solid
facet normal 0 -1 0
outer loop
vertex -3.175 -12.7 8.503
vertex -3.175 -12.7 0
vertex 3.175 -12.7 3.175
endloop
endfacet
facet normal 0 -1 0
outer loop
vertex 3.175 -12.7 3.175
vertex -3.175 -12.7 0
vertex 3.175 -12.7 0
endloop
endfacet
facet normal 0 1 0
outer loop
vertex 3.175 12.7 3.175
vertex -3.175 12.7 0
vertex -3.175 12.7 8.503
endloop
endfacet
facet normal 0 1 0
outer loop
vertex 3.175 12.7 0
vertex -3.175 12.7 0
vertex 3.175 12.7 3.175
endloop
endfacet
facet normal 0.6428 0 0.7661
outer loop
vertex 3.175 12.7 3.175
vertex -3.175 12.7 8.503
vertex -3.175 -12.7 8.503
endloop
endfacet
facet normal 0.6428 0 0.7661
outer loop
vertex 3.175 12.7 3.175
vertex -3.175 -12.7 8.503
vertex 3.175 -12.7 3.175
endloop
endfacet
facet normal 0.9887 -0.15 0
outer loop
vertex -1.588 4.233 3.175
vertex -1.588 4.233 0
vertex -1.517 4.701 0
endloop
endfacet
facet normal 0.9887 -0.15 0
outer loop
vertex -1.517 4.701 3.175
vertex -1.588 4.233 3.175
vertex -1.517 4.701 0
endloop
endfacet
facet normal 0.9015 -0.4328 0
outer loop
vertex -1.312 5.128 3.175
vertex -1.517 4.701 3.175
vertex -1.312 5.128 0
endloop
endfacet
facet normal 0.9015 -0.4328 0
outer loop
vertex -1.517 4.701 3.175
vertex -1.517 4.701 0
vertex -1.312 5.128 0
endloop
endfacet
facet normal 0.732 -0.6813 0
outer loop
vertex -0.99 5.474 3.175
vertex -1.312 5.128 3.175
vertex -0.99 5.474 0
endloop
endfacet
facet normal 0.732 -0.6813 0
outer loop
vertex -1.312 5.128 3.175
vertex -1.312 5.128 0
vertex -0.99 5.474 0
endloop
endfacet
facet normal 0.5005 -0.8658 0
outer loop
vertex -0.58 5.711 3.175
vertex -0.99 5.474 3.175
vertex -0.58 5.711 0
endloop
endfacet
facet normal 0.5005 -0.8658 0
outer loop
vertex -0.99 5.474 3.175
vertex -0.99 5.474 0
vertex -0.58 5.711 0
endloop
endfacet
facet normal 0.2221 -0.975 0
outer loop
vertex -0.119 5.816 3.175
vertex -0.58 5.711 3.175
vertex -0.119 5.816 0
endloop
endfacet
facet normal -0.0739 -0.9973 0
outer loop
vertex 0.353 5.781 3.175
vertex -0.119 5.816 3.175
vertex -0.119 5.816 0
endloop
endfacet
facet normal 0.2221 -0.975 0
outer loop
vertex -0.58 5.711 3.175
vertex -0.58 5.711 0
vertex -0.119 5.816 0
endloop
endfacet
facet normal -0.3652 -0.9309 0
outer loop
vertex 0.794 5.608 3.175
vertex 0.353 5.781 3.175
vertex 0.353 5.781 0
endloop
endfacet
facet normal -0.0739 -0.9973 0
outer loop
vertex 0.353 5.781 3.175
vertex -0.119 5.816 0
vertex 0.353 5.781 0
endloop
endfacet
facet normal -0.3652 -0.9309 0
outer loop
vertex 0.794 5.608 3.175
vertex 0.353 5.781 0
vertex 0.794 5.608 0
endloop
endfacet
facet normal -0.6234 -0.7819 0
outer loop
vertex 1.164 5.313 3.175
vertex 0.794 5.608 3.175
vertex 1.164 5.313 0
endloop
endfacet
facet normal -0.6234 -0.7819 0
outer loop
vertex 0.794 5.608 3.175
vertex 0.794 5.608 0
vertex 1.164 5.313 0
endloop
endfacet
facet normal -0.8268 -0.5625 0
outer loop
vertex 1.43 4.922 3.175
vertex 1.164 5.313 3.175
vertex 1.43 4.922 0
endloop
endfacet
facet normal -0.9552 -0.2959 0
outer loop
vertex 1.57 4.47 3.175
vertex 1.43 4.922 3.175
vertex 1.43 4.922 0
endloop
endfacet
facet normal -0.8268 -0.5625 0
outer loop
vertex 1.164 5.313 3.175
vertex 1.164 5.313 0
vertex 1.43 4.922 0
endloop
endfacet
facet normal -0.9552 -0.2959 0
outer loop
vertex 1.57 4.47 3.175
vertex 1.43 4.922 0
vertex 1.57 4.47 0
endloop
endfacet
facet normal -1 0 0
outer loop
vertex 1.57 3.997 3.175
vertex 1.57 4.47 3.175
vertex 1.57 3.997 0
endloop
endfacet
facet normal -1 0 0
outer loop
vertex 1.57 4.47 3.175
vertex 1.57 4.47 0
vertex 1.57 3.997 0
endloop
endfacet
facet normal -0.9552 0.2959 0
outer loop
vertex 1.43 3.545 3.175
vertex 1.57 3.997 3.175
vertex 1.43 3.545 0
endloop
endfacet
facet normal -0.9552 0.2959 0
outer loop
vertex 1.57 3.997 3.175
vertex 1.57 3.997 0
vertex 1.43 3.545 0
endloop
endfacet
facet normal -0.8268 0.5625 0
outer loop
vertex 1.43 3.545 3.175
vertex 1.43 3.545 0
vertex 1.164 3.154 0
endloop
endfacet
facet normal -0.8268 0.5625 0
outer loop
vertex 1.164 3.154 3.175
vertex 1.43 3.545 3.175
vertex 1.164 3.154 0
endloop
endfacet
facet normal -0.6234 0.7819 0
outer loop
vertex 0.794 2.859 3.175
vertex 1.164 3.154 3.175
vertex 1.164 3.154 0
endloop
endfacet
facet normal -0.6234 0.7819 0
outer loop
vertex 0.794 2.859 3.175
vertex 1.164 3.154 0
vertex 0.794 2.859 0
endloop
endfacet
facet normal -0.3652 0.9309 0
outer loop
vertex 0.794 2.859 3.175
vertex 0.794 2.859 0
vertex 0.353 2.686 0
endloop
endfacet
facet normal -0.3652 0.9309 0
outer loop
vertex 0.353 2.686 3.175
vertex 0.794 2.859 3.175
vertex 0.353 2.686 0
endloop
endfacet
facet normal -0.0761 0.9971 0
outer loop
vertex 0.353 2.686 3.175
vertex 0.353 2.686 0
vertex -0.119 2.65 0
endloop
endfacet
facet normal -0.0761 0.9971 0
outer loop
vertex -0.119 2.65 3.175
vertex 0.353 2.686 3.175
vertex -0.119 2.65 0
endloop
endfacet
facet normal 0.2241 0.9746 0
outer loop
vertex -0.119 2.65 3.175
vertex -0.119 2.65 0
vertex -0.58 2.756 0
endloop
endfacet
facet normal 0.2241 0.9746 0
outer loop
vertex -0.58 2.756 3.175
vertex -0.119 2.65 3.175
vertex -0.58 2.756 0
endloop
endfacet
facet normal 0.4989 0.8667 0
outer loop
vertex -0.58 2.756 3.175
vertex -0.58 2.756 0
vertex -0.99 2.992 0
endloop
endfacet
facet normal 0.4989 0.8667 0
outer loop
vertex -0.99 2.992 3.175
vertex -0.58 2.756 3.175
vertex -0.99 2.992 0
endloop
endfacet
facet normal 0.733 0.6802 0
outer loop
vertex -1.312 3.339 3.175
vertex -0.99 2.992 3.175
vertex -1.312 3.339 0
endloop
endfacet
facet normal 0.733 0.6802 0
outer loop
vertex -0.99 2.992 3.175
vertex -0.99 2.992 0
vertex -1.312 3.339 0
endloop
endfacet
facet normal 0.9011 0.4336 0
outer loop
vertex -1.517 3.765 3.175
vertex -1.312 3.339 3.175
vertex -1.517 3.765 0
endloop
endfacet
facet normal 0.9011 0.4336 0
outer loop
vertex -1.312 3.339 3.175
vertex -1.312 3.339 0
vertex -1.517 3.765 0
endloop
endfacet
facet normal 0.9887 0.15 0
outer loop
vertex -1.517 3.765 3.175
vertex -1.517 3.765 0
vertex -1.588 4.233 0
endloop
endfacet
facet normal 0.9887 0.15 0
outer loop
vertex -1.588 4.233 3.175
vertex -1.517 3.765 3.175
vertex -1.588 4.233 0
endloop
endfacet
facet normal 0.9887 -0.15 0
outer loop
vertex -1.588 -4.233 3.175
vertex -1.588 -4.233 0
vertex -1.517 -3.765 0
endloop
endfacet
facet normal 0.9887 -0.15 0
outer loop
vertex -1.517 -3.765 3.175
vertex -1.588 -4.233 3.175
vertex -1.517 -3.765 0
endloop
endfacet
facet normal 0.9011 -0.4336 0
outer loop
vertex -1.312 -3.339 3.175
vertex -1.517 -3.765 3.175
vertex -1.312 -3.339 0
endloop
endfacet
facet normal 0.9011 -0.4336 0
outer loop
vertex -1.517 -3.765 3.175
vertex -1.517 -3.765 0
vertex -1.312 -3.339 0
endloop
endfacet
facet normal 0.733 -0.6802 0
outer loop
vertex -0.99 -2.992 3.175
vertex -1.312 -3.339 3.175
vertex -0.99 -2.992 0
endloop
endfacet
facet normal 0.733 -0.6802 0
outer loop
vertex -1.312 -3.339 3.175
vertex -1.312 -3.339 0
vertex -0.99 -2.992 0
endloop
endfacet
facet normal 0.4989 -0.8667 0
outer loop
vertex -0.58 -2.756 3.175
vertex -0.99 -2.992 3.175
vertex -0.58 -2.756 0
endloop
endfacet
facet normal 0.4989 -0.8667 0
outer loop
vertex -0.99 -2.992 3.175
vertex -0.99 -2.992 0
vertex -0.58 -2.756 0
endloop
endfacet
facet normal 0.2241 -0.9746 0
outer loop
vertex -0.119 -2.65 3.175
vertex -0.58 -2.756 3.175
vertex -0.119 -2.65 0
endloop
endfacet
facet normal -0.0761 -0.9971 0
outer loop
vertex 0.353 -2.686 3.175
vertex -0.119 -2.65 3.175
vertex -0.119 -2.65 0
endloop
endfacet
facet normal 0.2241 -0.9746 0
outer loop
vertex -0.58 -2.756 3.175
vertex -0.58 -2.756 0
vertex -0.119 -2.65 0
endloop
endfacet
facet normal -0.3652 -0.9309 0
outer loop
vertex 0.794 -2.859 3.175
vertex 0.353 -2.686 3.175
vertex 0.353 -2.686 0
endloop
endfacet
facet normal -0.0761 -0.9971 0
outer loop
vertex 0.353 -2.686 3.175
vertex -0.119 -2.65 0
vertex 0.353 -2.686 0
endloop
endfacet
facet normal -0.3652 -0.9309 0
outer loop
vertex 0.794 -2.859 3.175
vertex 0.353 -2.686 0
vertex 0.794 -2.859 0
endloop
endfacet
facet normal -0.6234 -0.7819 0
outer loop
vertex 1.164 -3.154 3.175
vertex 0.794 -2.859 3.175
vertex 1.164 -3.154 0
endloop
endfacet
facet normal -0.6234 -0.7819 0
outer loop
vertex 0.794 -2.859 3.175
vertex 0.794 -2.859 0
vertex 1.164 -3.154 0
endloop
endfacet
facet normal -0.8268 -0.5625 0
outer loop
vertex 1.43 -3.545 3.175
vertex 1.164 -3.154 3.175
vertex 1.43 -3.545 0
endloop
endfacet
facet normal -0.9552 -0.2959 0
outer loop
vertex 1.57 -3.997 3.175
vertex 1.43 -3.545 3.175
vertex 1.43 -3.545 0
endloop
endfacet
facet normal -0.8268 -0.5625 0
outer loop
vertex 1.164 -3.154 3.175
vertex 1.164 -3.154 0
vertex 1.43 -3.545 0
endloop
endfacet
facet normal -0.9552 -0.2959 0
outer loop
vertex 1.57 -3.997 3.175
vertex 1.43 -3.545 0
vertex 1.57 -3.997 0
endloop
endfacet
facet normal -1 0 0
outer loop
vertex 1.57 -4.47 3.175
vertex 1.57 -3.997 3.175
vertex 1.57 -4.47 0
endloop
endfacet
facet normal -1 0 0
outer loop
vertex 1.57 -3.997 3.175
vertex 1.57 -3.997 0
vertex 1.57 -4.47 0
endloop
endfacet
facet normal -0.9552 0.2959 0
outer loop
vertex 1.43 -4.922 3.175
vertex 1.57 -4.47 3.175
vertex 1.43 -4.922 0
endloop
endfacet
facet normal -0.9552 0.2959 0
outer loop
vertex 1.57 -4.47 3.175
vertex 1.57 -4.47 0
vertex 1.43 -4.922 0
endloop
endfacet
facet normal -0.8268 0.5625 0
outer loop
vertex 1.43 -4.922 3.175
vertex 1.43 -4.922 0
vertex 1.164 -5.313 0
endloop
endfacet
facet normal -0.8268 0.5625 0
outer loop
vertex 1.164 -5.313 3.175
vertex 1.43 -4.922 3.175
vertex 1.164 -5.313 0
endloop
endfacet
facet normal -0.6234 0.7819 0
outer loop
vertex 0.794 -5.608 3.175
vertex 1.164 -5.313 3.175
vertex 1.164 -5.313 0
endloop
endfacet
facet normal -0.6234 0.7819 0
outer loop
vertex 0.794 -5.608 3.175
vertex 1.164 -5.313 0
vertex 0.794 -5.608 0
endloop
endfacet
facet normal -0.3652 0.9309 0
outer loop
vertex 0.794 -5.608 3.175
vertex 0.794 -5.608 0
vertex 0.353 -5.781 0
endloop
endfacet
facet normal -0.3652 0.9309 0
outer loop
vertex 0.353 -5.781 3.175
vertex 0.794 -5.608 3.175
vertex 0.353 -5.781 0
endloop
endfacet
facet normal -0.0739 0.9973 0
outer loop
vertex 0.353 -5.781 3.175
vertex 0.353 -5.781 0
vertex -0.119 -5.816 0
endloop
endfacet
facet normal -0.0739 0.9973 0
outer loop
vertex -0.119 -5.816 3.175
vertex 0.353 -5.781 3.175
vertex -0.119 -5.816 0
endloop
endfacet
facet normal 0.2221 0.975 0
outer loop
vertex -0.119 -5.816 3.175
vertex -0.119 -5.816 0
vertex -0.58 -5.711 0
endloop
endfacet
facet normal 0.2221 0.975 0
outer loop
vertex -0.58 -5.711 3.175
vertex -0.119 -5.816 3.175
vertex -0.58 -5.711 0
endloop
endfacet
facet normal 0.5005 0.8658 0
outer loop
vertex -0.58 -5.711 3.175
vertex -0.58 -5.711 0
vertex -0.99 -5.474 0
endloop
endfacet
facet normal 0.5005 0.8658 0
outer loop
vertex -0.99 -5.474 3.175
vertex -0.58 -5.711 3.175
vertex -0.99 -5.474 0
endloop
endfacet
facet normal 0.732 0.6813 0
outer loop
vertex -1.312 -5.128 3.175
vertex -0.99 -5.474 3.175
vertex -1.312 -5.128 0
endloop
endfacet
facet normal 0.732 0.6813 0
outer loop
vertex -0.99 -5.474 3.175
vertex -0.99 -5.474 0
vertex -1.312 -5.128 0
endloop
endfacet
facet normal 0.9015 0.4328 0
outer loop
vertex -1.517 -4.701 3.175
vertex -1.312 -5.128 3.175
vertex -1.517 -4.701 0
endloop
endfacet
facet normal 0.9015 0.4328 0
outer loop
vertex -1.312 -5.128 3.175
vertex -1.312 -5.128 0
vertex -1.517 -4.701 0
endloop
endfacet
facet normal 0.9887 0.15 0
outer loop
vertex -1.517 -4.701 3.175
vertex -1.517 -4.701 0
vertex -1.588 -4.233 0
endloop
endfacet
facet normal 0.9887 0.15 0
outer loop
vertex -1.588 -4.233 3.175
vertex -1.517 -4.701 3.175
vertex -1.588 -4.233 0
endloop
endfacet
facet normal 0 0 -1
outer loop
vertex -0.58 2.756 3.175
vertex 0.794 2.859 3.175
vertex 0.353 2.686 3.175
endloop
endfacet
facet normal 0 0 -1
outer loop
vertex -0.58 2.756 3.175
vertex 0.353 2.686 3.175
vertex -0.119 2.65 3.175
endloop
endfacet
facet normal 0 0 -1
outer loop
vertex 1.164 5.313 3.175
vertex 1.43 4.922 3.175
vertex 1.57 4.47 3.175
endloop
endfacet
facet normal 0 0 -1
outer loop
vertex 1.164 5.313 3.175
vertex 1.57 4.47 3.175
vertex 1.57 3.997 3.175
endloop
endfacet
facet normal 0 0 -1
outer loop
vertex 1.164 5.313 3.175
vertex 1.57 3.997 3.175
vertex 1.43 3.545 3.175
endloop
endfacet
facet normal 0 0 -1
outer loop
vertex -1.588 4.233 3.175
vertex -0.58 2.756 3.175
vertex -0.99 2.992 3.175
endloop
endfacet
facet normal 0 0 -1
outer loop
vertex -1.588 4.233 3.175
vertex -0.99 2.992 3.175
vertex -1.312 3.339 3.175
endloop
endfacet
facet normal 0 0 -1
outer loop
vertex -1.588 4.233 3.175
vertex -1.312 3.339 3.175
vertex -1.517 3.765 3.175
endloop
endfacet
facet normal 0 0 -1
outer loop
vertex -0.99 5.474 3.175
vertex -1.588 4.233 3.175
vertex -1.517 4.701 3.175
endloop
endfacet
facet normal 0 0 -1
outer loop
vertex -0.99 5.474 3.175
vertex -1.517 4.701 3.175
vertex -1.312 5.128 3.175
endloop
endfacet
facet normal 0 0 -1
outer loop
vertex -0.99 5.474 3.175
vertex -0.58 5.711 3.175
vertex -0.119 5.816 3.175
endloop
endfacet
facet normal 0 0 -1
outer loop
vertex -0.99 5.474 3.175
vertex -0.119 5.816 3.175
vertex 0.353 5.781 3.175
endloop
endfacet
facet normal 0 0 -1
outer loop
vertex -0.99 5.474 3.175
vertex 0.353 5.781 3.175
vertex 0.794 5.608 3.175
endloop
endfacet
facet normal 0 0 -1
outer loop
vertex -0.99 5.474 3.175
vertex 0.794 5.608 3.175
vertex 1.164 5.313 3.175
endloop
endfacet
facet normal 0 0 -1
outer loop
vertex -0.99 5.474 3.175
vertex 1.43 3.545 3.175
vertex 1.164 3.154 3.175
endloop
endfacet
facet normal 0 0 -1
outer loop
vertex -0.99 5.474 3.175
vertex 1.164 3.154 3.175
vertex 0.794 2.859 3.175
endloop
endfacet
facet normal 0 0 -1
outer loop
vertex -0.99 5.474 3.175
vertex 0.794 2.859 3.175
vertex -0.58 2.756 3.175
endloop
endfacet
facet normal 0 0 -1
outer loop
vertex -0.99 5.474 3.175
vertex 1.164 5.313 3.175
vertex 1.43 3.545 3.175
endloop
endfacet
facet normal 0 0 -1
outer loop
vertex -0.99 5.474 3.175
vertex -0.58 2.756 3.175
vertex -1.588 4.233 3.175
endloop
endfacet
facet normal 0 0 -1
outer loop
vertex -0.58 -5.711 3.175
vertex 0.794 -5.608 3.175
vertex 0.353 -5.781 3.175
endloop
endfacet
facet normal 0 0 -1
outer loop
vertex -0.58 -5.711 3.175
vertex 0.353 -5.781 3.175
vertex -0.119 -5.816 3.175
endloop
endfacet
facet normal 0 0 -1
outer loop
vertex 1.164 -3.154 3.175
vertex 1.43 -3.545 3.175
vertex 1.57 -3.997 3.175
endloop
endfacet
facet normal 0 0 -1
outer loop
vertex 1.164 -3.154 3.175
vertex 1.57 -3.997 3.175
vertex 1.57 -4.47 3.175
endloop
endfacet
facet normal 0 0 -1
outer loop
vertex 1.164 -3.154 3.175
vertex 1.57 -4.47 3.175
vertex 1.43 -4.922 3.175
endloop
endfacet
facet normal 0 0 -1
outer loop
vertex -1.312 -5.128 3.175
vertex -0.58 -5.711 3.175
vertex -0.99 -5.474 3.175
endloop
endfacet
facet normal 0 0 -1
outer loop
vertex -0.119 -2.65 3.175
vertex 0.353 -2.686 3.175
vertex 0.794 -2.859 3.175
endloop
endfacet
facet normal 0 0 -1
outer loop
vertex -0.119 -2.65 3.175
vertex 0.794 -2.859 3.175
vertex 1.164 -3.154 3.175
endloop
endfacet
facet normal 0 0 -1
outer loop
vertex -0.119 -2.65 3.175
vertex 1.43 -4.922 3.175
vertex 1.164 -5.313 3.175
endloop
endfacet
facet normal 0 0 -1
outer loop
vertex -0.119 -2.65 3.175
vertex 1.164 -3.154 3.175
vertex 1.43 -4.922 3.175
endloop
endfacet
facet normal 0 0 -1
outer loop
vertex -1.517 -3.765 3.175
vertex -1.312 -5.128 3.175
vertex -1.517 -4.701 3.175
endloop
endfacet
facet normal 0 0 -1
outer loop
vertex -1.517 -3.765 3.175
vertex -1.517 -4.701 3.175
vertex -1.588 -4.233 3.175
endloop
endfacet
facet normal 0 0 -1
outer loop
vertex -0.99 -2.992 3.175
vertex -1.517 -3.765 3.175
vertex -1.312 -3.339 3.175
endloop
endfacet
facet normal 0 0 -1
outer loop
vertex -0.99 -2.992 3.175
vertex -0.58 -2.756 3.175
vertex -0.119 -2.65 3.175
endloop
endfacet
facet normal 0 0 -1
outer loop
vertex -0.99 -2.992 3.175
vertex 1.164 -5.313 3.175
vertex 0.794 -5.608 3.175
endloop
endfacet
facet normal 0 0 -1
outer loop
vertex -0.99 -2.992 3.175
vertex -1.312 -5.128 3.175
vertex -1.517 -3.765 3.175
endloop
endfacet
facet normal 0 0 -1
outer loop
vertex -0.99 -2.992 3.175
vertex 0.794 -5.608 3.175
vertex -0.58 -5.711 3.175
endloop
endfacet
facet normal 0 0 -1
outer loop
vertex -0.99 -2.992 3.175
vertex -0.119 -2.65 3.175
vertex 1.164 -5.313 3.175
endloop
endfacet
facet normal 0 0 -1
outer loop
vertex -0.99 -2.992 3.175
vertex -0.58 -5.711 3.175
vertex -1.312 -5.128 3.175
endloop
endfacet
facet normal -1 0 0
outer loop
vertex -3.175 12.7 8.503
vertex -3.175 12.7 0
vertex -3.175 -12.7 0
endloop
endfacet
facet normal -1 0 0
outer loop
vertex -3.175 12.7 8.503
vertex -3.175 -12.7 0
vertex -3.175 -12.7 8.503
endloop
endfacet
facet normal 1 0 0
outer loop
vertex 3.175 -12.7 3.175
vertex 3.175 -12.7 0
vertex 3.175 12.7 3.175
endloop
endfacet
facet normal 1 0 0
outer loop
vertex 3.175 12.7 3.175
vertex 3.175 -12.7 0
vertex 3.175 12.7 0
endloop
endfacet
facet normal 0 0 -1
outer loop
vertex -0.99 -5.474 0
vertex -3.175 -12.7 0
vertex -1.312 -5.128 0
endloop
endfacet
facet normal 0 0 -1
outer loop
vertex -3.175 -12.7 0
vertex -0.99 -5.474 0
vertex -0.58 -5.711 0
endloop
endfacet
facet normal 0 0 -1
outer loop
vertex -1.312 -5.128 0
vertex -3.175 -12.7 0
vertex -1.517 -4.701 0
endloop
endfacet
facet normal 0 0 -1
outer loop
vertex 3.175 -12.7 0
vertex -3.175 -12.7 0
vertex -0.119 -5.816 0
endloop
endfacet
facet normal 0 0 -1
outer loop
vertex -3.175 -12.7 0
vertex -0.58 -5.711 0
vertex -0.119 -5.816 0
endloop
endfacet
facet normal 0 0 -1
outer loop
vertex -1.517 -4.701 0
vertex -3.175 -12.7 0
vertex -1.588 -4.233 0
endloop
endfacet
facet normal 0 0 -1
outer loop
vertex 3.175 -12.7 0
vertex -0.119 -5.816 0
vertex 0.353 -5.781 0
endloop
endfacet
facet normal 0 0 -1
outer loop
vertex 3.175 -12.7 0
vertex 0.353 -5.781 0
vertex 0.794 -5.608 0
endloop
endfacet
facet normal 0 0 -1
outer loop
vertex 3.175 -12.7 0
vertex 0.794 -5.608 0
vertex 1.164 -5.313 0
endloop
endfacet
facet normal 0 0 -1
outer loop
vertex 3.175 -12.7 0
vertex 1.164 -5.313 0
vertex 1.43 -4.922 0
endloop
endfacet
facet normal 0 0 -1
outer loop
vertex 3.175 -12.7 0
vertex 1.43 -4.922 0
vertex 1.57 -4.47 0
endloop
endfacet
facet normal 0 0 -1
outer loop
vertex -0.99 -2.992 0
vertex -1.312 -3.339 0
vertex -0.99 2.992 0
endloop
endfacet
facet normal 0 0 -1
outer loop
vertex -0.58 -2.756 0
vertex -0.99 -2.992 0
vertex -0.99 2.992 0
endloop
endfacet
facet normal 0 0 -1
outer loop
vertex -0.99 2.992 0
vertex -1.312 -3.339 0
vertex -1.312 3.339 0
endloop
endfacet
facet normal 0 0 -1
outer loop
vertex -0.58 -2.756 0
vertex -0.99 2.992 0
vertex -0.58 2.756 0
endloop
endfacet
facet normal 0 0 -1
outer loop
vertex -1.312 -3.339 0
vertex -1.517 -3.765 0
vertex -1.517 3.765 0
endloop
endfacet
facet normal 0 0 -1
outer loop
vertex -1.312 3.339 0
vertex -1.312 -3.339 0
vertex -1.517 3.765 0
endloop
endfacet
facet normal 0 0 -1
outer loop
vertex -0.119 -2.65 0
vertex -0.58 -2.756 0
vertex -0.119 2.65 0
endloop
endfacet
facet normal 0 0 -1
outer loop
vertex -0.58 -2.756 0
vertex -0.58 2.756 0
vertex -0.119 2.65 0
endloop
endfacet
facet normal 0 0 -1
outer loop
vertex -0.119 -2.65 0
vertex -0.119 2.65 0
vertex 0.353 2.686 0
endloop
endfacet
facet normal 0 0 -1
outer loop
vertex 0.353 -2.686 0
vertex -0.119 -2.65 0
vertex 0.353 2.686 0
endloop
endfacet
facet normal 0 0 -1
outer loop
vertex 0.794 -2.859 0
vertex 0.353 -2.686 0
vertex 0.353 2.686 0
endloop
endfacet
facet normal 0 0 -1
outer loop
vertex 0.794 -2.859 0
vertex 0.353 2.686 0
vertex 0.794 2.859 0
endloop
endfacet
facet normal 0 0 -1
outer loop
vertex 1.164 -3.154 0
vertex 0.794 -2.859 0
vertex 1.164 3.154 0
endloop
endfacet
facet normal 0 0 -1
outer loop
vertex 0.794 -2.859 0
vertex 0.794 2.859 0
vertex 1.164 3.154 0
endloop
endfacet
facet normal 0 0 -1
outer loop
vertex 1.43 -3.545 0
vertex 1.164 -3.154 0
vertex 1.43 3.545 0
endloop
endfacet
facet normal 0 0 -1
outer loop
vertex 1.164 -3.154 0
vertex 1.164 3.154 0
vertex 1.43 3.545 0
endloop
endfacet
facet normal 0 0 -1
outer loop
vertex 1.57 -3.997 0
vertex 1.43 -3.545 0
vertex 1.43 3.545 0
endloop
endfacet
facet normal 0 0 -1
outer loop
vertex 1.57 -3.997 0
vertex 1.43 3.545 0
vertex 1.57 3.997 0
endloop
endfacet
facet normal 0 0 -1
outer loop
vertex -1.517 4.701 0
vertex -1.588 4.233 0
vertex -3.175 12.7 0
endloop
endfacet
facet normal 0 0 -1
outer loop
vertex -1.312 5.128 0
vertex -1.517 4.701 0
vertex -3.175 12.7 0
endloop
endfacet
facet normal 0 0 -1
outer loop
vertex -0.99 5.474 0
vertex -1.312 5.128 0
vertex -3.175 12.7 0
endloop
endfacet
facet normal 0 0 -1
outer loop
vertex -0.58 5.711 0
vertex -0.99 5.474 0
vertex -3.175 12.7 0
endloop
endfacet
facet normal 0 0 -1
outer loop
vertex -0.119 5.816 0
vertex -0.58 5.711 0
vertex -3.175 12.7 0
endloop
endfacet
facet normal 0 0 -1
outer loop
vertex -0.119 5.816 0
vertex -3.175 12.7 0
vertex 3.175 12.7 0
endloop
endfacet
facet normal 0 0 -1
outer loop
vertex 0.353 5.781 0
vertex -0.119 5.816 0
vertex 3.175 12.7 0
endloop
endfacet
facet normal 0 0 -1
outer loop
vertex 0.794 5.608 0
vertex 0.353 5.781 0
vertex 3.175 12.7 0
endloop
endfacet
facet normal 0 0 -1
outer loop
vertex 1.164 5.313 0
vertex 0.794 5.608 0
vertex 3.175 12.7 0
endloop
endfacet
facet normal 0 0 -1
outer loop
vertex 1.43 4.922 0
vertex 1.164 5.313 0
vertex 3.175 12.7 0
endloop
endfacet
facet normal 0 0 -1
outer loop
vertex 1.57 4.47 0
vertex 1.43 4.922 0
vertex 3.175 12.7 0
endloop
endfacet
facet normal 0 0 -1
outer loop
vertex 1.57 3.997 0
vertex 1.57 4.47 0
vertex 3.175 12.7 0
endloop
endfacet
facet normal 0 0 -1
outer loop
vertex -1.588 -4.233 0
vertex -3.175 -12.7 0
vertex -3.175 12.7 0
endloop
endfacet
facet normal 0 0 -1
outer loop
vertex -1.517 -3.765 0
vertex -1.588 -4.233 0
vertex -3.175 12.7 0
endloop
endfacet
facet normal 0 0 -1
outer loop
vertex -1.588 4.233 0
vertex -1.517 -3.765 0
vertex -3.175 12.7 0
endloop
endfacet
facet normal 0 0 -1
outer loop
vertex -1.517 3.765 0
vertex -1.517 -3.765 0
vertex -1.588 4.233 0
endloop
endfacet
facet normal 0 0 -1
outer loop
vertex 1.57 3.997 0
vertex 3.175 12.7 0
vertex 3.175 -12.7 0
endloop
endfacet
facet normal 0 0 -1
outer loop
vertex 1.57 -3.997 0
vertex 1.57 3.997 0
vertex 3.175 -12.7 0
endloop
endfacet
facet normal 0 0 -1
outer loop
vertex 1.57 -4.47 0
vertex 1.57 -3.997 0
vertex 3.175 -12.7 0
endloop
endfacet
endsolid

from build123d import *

# Parameters (mm, degrees)
SKETCH1_W           = 6.35
SKETCH1_H           = 25.4
BOSS_EXTRUDE1_DEPTH = 3.175
BOSS_EXTRUDE2_DEPTH = 25.4
SKETCH3_R           = 1.5875
CUT_EXTRUDE1_DEPTH  = 3.175


with BuildPart() as part:
    # Sketch1 → Boss-Extrude1 (new body)
    with BuildSketch(Plane.XY):
        Rectangle(SKETCH1_W, SKETCH1_H)
    extrude(amount=BOSS_EXTRUDE1_DEPTH)

    # Sketch2 → Boss-Extrude2 (add)
    with BuildSketch(Plane(origin=(0, 12.7, 0), x_dir=(1, 0, 0), z_dir=(0, 1, 0))):
        Polygon((-3.175, -3.175), (-3.175, -8.503282658), (3.175, -3.175), align=None)
    extrude(amount=-BOSS_EXTRUDE2_DEPTH)

    # Sketch3 → Cut-Extrude1 (cut)
    with BuildSketch(Plane(origin=(0, 0, 0), x_dir=(-1, 0, 0), z_dir=(0, 0, -1))):
        with Locations((0, 4.233333333)):
            Circle(SKETCH3_R)
        with Locations((0, -4.233333333)):
            Circle(SKETCH3_R)
    extrude(amount=-CUT_EXTRUDE1_DEPTH, mode=Mode.SUBTRACT)


solid = part.part
